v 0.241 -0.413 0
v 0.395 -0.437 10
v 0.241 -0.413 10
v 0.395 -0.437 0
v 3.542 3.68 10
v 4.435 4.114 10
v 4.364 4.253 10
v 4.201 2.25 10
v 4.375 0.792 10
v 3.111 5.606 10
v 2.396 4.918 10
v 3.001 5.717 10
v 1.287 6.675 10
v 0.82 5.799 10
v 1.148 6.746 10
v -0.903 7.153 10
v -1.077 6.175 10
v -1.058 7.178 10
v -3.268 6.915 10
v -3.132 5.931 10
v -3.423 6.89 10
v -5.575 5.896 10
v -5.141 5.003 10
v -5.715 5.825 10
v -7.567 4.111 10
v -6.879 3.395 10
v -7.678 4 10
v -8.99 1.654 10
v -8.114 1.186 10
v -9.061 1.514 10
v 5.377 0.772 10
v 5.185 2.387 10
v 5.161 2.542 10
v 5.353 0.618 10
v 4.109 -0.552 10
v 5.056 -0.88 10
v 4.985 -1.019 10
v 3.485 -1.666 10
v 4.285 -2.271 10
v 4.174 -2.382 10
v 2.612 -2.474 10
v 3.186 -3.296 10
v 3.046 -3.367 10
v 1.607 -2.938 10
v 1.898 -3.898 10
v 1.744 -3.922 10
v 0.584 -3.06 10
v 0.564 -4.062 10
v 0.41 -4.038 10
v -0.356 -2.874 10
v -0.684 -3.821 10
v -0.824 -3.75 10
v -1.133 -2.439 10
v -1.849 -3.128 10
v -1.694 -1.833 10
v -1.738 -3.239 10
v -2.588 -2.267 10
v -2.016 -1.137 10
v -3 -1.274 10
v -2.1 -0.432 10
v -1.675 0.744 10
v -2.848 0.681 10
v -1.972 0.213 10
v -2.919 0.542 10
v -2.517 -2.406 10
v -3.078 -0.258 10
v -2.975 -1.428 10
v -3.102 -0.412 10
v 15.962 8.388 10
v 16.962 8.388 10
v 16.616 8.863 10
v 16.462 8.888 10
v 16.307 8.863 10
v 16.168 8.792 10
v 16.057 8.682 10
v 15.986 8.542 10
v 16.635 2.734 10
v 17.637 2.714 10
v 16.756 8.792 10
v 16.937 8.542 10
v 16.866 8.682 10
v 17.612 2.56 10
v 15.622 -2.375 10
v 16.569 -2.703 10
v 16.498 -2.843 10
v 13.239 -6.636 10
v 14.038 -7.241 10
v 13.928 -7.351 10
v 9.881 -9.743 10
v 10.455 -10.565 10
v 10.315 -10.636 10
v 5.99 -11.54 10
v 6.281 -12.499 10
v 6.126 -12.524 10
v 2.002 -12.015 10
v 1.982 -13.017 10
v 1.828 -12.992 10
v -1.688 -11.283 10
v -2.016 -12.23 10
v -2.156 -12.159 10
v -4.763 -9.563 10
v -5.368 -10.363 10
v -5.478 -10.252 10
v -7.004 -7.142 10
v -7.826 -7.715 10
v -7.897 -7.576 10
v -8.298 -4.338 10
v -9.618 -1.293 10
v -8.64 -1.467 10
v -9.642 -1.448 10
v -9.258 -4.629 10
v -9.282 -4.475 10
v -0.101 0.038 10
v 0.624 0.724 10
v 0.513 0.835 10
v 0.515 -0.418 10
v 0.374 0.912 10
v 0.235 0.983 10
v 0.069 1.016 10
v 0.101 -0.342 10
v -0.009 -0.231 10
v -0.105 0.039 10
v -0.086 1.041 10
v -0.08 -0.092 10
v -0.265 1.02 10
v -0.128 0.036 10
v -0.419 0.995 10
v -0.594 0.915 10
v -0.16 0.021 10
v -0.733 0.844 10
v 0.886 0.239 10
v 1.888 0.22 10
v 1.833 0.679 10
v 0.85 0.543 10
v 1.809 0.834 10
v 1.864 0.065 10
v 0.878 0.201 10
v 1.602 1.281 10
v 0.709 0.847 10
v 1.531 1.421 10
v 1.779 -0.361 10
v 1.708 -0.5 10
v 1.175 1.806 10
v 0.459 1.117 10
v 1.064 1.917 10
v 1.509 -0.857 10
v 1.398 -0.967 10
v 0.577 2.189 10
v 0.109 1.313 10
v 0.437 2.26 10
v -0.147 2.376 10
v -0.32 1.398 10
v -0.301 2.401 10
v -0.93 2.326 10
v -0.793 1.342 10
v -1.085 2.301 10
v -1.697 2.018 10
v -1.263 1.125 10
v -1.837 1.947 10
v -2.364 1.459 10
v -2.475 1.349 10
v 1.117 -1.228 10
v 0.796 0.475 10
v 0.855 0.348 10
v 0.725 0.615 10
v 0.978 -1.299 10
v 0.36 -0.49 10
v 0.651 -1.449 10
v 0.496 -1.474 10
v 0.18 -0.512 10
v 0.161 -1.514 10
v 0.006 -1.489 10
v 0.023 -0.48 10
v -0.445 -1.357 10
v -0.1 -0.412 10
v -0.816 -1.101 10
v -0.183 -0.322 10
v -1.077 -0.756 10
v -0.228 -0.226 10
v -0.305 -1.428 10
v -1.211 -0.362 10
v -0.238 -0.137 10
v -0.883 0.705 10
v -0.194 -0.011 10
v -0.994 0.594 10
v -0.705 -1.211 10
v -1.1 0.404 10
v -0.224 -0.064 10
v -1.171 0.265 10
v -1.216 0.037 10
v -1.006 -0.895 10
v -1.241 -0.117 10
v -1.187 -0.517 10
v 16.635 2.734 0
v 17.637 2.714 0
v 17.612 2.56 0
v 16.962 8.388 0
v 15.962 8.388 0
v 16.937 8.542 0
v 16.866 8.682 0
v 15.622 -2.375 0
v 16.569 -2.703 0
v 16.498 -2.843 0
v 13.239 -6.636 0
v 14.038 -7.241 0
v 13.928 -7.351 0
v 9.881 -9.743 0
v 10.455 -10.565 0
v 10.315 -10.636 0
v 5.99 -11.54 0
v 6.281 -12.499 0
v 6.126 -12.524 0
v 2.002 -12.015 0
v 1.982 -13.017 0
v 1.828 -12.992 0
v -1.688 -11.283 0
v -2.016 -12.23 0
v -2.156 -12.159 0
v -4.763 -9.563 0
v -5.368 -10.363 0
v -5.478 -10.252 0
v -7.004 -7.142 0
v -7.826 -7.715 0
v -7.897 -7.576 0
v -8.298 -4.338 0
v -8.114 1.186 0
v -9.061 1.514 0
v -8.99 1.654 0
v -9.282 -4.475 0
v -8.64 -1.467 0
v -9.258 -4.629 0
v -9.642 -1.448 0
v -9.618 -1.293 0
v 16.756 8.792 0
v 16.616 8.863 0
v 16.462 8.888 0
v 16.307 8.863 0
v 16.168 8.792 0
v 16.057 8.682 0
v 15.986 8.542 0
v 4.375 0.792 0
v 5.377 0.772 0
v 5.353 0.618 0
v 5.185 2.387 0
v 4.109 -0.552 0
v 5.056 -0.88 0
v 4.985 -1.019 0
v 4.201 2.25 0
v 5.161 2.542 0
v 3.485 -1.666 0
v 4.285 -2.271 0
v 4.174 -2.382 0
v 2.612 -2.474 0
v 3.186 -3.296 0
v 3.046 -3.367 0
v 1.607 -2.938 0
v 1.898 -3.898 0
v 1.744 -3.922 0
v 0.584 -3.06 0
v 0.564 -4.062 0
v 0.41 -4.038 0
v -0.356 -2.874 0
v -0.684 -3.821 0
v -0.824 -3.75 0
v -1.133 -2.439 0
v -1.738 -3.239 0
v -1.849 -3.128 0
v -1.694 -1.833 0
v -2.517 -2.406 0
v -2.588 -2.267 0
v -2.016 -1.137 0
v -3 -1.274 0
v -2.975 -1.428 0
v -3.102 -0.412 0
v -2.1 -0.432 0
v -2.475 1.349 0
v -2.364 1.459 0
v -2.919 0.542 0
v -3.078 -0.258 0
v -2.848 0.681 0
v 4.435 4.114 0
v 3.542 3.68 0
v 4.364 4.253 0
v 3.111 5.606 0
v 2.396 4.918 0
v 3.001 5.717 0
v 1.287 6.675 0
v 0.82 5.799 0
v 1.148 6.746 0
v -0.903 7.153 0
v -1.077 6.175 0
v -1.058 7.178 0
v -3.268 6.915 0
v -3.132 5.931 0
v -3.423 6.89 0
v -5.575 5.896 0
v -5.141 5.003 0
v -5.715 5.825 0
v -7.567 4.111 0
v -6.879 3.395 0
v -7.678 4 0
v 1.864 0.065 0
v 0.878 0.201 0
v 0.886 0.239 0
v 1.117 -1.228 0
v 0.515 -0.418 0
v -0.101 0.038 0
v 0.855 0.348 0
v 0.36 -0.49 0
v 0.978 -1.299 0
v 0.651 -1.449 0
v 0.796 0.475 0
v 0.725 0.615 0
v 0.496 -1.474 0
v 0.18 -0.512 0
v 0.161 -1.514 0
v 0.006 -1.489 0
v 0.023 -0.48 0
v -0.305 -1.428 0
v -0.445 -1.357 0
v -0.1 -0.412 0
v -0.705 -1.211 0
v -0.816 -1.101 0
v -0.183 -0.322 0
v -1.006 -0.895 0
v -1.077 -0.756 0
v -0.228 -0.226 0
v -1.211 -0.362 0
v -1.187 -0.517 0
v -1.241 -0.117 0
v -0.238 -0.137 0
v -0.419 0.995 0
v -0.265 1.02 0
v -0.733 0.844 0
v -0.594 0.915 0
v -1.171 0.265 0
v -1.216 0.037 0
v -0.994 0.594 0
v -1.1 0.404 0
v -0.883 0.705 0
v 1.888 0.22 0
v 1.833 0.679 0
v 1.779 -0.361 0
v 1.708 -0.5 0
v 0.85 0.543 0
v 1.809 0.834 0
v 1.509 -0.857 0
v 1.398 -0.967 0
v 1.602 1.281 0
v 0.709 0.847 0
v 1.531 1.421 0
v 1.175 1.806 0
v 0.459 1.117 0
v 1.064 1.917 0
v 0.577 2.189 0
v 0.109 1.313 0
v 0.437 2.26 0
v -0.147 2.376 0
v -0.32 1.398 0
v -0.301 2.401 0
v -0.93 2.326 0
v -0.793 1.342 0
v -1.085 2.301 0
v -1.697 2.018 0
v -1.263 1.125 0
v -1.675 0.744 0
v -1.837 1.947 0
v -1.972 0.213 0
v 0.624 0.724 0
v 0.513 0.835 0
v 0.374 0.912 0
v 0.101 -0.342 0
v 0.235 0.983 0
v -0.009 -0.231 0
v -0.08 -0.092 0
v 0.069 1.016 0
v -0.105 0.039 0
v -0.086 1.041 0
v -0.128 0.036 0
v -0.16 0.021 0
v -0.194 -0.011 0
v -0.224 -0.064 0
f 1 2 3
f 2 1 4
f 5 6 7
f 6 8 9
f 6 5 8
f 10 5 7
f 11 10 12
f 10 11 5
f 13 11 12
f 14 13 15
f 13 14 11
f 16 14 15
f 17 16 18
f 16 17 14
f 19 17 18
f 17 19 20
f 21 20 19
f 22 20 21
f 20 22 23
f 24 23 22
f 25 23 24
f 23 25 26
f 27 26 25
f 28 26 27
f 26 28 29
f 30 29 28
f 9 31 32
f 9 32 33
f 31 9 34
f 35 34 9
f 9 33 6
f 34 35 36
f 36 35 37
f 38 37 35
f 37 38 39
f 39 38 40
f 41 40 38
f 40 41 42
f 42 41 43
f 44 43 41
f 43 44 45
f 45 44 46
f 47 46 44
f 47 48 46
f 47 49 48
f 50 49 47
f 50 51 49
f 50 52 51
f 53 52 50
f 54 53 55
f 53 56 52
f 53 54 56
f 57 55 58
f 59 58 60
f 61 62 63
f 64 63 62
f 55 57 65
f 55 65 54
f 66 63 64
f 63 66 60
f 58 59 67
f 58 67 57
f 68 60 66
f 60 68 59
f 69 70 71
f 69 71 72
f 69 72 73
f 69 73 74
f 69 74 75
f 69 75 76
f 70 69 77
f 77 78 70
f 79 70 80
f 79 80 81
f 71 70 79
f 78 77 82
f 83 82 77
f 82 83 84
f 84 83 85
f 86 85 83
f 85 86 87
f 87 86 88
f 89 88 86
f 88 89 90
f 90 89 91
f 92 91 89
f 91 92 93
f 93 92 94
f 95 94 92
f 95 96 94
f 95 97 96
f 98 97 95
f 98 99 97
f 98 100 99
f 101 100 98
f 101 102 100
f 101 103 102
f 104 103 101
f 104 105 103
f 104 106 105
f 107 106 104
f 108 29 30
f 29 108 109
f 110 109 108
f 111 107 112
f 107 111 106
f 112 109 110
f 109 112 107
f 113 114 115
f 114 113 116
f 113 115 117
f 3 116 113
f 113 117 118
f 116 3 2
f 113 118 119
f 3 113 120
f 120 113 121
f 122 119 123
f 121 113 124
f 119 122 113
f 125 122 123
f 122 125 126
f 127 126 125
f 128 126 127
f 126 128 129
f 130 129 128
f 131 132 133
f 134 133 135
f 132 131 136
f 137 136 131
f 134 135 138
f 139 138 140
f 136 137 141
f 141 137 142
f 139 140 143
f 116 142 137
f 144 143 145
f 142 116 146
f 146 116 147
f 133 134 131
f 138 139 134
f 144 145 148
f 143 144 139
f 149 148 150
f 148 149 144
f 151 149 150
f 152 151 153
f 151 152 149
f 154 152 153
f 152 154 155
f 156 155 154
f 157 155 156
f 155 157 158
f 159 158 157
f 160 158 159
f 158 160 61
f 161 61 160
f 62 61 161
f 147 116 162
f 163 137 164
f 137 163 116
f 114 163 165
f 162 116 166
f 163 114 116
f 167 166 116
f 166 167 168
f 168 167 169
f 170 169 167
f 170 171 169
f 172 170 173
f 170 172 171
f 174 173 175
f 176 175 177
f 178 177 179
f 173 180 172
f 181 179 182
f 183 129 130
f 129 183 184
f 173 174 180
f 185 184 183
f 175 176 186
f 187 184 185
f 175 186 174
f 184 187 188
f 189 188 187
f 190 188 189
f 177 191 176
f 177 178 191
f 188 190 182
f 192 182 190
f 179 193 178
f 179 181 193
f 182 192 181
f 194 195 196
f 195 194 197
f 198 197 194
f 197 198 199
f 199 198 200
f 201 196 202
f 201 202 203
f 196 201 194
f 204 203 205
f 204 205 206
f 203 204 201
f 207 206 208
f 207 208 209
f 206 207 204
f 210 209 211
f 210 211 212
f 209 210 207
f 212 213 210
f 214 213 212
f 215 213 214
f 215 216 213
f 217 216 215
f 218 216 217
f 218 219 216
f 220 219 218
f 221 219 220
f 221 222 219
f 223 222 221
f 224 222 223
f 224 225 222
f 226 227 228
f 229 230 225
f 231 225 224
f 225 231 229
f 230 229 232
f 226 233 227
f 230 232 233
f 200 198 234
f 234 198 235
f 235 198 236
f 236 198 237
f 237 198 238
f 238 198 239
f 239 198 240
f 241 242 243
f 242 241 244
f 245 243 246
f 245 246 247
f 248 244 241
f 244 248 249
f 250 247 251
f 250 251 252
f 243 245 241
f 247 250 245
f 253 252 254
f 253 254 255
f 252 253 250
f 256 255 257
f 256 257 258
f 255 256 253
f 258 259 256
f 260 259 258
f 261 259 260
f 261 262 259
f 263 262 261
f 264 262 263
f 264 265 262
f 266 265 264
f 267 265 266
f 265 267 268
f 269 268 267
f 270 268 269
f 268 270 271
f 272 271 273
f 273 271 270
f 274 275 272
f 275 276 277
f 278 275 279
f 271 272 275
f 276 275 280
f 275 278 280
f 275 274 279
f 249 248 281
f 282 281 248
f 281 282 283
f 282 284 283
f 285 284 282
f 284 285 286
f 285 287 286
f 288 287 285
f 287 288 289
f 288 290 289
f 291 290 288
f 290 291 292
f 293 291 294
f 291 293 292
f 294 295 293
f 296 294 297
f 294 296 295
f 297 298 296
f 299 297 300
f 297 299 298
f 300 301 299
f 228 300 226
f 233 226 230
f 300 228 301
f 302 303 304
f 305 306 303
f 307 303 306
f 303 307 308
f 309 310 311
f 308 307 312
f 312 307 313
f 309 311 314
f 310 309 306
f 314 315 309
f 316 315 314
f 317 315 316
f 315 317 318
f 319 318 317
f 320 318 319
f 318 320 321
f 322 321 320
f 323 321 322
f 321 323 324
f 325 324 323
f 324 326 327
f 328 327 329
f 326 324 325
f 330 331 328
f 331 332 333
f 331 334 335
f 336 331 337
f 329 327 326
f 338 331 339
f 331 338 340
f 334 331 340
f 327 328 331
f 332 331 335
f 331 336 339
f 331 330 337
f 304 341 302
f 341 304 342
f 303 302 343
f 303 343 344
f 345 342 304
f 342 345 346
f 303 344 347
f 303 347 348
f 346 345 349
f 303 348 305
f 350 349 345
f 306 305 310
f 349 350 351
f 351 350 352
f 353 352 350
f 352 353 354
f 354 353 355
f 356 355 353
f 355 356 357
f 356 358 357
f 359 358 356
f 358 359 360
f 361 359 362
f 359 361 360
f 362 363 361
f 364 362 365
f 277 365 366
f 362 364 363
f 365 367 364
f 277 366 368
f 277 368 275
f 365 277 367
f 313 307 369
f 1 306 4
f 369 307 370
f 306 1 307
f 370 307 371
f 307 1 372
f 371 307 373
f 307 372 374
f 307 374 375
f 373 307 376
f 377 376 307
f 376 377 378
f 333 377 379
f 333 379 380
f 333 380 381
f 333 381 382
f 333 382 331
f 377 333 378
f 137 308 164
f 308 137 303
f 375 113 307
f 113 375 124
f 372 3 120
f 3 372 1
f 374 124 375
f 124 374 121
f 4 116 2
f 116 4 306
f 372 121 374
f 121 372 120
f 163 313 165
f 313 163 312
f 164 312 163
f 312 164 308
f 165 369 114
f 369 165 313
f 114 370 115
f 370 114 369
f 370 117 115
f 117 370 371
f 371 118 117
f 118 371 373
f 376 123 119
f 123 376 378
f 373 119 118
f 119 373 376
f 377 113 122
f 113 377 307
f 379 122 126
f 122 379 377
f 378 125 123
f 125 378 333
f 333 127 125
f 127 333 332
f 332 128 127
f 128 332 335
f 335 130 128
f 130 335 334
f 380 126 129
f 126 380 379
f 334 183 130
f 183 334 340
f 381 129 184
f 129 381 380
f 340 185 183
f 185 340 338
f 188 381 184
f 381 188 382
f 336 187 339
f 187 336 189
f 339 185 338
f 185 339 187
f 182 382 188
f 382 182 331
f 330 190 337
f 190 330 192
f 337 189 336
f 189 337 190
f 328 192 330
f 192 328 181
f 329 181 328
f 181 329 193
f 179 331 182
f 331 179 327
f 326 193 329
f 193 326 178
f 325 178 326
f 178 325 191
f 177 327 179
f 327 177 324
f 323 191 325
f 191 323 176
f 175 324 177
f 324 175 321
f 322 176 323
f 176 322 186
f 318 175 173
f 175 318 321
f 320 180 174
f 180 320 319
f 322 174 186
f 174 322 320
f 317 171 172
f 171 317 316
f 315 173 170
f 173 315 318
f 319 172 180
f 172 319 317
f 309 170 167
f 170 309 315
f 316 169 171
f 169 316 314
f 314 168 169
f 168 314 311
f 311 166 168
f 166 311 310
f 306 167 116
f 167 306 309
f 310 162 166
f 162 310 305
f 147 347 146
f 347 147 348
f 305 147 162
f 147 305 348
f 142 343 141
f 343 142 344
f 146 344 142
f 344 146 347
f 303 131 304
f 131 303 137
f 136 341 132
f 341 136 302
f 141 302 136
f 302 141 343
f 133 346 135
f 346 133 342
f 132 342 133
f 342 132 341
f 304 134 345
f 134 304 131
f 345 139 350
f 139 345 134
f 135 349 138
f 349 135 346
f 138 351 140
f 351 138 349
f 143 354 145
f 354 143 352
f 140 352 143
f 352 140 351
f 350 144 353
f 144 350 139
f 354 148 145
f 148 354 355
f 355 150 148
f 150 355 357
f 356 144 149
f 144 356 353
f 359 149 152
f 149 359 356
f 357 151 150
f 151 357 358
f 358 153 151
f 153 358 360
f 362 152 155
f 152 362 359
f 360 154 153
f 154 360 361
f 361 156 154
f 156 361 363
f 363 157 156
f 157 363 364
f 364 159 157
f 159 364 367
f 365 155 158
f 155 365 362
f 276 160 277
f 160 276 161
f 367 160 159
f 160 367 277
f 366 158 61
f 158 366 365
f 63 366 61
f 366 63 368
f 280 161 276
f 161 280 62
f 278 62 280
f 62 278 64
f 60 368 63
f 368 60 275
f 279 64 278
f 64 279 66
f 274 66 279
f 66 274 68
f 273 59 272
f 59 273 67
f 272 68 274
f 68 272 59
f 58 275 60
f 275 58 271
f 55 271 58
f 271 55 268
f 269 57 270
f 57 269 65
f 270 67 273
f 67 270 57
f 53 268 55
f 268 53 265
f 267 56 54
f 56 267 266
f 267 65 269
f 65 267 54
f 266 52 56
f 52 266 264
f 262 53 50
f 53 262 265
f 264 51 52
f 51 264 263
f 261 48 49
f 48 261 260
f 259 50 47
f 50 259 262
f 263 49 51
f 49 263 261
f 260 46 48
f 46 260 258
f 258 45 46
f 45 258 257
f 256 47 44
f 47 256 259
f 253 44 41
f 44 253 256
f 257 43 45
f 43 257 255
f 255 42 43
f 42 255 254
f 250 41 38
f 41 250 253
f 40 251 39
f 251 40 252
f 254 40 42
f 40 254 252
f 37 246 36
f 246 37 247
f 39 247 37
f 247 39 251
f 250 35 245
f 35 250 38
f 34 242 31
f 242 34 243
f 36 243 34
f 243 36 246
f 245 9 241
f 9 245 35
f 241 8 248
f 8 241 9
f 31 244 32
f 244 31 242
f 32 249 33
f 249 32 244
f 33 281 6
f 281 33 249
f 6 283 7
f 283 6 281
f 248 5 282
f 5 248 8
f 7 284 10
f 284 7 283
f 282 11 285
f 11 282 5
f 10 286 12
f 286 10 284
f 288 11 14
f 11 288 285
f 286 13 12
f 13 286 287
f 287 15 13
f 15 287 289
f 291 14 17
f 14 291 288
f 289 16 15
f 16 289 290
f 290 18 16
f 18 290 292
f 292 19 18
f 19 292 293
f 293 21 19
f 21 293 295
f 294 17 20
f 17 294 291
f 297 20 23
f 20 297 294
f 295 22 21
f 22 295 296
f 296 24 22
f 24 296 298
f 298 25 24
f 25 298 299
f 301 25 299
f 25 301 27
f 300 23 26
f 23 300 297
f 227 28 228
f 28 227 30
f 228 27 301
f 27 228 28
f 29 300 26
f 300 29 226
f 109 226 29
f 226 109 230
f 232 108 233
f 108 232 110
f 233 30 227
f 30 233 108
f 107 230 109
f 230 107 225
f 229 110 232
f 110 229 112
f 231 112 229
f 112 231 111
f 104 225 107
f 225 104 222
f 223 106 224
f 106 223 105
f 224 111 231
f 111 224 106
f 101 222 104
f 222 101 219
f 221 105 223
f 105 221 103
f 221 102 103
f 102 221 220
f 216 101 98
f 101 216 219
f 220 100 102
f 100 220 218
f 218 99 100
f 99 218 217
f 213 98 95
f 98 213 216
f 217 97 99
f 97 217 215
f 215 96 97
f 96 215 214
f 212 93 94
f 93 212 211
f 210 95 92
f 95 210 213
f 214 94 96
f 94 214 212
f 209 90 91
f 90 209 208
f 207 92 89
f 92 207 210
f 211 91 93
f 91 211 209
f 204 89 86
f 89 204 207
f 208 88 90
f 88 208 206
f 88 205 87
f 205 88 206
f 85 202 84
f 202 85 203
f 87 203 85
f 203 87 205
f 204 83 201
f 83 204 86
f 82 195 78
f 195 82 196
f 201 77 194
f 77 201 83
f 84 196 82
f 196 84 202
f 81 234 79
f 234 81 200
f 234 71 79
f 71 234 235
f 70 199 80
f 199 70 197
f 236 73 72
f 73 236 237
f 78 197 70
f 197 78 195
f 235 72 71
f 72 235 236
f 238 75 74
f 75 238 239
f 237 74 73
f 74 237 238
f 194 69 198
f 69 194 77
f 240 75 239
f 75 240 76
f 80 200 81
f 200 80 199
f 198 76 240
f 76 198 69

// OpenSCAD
//A logarthmic Spiral has the form r=a*exp(b*theta);

loops=3;
$fn=20; //resolution
steps_per_loop=$fn;
wallThickness = 0.5;
height = 10;

a=0.4;
b=0.2;
incrementBy = 1;

for(i=[0:incrementBy:loops*steps_per_loop]){
hull(){
translate([r(rad(i))*cos(deg(i+0.5)),r(rad(i))*sin(deg(i+0.5)),0])
cylinder(r=wallThickness,height);

translate([r(rad(i+incrementBy))*cos(deg(i+incrementBy+0.5)),r(rad(i+1))*sin(deg(i+incrementBy+0.5)),0])
cylinder(r=wallThickness,height); 
}
}

////////////////// Functions //////////////////////////
function deg(n)=360*n/steps_per_loop;
function rad(n)=2*PI*n/steps_per_loop;
function arc_length(n)= //The length of a line segment = sqrt( (y2-y1)^2 + (x2-x1)^2 )
		sqrt(
			pow(
				r(rad(n+1))*sin(deg(n+1)) -
				r(rad(n))*sin(deg(n))
				,2) 
			+
			pow(
				r(rad(n+1))*cos(deg(n+1)) -
				r(rad(n))*cos(deg(n))
				,2)
			);
function r(th)=a*exp(b*th);
function d(i) =r(rad(i))/3;	
